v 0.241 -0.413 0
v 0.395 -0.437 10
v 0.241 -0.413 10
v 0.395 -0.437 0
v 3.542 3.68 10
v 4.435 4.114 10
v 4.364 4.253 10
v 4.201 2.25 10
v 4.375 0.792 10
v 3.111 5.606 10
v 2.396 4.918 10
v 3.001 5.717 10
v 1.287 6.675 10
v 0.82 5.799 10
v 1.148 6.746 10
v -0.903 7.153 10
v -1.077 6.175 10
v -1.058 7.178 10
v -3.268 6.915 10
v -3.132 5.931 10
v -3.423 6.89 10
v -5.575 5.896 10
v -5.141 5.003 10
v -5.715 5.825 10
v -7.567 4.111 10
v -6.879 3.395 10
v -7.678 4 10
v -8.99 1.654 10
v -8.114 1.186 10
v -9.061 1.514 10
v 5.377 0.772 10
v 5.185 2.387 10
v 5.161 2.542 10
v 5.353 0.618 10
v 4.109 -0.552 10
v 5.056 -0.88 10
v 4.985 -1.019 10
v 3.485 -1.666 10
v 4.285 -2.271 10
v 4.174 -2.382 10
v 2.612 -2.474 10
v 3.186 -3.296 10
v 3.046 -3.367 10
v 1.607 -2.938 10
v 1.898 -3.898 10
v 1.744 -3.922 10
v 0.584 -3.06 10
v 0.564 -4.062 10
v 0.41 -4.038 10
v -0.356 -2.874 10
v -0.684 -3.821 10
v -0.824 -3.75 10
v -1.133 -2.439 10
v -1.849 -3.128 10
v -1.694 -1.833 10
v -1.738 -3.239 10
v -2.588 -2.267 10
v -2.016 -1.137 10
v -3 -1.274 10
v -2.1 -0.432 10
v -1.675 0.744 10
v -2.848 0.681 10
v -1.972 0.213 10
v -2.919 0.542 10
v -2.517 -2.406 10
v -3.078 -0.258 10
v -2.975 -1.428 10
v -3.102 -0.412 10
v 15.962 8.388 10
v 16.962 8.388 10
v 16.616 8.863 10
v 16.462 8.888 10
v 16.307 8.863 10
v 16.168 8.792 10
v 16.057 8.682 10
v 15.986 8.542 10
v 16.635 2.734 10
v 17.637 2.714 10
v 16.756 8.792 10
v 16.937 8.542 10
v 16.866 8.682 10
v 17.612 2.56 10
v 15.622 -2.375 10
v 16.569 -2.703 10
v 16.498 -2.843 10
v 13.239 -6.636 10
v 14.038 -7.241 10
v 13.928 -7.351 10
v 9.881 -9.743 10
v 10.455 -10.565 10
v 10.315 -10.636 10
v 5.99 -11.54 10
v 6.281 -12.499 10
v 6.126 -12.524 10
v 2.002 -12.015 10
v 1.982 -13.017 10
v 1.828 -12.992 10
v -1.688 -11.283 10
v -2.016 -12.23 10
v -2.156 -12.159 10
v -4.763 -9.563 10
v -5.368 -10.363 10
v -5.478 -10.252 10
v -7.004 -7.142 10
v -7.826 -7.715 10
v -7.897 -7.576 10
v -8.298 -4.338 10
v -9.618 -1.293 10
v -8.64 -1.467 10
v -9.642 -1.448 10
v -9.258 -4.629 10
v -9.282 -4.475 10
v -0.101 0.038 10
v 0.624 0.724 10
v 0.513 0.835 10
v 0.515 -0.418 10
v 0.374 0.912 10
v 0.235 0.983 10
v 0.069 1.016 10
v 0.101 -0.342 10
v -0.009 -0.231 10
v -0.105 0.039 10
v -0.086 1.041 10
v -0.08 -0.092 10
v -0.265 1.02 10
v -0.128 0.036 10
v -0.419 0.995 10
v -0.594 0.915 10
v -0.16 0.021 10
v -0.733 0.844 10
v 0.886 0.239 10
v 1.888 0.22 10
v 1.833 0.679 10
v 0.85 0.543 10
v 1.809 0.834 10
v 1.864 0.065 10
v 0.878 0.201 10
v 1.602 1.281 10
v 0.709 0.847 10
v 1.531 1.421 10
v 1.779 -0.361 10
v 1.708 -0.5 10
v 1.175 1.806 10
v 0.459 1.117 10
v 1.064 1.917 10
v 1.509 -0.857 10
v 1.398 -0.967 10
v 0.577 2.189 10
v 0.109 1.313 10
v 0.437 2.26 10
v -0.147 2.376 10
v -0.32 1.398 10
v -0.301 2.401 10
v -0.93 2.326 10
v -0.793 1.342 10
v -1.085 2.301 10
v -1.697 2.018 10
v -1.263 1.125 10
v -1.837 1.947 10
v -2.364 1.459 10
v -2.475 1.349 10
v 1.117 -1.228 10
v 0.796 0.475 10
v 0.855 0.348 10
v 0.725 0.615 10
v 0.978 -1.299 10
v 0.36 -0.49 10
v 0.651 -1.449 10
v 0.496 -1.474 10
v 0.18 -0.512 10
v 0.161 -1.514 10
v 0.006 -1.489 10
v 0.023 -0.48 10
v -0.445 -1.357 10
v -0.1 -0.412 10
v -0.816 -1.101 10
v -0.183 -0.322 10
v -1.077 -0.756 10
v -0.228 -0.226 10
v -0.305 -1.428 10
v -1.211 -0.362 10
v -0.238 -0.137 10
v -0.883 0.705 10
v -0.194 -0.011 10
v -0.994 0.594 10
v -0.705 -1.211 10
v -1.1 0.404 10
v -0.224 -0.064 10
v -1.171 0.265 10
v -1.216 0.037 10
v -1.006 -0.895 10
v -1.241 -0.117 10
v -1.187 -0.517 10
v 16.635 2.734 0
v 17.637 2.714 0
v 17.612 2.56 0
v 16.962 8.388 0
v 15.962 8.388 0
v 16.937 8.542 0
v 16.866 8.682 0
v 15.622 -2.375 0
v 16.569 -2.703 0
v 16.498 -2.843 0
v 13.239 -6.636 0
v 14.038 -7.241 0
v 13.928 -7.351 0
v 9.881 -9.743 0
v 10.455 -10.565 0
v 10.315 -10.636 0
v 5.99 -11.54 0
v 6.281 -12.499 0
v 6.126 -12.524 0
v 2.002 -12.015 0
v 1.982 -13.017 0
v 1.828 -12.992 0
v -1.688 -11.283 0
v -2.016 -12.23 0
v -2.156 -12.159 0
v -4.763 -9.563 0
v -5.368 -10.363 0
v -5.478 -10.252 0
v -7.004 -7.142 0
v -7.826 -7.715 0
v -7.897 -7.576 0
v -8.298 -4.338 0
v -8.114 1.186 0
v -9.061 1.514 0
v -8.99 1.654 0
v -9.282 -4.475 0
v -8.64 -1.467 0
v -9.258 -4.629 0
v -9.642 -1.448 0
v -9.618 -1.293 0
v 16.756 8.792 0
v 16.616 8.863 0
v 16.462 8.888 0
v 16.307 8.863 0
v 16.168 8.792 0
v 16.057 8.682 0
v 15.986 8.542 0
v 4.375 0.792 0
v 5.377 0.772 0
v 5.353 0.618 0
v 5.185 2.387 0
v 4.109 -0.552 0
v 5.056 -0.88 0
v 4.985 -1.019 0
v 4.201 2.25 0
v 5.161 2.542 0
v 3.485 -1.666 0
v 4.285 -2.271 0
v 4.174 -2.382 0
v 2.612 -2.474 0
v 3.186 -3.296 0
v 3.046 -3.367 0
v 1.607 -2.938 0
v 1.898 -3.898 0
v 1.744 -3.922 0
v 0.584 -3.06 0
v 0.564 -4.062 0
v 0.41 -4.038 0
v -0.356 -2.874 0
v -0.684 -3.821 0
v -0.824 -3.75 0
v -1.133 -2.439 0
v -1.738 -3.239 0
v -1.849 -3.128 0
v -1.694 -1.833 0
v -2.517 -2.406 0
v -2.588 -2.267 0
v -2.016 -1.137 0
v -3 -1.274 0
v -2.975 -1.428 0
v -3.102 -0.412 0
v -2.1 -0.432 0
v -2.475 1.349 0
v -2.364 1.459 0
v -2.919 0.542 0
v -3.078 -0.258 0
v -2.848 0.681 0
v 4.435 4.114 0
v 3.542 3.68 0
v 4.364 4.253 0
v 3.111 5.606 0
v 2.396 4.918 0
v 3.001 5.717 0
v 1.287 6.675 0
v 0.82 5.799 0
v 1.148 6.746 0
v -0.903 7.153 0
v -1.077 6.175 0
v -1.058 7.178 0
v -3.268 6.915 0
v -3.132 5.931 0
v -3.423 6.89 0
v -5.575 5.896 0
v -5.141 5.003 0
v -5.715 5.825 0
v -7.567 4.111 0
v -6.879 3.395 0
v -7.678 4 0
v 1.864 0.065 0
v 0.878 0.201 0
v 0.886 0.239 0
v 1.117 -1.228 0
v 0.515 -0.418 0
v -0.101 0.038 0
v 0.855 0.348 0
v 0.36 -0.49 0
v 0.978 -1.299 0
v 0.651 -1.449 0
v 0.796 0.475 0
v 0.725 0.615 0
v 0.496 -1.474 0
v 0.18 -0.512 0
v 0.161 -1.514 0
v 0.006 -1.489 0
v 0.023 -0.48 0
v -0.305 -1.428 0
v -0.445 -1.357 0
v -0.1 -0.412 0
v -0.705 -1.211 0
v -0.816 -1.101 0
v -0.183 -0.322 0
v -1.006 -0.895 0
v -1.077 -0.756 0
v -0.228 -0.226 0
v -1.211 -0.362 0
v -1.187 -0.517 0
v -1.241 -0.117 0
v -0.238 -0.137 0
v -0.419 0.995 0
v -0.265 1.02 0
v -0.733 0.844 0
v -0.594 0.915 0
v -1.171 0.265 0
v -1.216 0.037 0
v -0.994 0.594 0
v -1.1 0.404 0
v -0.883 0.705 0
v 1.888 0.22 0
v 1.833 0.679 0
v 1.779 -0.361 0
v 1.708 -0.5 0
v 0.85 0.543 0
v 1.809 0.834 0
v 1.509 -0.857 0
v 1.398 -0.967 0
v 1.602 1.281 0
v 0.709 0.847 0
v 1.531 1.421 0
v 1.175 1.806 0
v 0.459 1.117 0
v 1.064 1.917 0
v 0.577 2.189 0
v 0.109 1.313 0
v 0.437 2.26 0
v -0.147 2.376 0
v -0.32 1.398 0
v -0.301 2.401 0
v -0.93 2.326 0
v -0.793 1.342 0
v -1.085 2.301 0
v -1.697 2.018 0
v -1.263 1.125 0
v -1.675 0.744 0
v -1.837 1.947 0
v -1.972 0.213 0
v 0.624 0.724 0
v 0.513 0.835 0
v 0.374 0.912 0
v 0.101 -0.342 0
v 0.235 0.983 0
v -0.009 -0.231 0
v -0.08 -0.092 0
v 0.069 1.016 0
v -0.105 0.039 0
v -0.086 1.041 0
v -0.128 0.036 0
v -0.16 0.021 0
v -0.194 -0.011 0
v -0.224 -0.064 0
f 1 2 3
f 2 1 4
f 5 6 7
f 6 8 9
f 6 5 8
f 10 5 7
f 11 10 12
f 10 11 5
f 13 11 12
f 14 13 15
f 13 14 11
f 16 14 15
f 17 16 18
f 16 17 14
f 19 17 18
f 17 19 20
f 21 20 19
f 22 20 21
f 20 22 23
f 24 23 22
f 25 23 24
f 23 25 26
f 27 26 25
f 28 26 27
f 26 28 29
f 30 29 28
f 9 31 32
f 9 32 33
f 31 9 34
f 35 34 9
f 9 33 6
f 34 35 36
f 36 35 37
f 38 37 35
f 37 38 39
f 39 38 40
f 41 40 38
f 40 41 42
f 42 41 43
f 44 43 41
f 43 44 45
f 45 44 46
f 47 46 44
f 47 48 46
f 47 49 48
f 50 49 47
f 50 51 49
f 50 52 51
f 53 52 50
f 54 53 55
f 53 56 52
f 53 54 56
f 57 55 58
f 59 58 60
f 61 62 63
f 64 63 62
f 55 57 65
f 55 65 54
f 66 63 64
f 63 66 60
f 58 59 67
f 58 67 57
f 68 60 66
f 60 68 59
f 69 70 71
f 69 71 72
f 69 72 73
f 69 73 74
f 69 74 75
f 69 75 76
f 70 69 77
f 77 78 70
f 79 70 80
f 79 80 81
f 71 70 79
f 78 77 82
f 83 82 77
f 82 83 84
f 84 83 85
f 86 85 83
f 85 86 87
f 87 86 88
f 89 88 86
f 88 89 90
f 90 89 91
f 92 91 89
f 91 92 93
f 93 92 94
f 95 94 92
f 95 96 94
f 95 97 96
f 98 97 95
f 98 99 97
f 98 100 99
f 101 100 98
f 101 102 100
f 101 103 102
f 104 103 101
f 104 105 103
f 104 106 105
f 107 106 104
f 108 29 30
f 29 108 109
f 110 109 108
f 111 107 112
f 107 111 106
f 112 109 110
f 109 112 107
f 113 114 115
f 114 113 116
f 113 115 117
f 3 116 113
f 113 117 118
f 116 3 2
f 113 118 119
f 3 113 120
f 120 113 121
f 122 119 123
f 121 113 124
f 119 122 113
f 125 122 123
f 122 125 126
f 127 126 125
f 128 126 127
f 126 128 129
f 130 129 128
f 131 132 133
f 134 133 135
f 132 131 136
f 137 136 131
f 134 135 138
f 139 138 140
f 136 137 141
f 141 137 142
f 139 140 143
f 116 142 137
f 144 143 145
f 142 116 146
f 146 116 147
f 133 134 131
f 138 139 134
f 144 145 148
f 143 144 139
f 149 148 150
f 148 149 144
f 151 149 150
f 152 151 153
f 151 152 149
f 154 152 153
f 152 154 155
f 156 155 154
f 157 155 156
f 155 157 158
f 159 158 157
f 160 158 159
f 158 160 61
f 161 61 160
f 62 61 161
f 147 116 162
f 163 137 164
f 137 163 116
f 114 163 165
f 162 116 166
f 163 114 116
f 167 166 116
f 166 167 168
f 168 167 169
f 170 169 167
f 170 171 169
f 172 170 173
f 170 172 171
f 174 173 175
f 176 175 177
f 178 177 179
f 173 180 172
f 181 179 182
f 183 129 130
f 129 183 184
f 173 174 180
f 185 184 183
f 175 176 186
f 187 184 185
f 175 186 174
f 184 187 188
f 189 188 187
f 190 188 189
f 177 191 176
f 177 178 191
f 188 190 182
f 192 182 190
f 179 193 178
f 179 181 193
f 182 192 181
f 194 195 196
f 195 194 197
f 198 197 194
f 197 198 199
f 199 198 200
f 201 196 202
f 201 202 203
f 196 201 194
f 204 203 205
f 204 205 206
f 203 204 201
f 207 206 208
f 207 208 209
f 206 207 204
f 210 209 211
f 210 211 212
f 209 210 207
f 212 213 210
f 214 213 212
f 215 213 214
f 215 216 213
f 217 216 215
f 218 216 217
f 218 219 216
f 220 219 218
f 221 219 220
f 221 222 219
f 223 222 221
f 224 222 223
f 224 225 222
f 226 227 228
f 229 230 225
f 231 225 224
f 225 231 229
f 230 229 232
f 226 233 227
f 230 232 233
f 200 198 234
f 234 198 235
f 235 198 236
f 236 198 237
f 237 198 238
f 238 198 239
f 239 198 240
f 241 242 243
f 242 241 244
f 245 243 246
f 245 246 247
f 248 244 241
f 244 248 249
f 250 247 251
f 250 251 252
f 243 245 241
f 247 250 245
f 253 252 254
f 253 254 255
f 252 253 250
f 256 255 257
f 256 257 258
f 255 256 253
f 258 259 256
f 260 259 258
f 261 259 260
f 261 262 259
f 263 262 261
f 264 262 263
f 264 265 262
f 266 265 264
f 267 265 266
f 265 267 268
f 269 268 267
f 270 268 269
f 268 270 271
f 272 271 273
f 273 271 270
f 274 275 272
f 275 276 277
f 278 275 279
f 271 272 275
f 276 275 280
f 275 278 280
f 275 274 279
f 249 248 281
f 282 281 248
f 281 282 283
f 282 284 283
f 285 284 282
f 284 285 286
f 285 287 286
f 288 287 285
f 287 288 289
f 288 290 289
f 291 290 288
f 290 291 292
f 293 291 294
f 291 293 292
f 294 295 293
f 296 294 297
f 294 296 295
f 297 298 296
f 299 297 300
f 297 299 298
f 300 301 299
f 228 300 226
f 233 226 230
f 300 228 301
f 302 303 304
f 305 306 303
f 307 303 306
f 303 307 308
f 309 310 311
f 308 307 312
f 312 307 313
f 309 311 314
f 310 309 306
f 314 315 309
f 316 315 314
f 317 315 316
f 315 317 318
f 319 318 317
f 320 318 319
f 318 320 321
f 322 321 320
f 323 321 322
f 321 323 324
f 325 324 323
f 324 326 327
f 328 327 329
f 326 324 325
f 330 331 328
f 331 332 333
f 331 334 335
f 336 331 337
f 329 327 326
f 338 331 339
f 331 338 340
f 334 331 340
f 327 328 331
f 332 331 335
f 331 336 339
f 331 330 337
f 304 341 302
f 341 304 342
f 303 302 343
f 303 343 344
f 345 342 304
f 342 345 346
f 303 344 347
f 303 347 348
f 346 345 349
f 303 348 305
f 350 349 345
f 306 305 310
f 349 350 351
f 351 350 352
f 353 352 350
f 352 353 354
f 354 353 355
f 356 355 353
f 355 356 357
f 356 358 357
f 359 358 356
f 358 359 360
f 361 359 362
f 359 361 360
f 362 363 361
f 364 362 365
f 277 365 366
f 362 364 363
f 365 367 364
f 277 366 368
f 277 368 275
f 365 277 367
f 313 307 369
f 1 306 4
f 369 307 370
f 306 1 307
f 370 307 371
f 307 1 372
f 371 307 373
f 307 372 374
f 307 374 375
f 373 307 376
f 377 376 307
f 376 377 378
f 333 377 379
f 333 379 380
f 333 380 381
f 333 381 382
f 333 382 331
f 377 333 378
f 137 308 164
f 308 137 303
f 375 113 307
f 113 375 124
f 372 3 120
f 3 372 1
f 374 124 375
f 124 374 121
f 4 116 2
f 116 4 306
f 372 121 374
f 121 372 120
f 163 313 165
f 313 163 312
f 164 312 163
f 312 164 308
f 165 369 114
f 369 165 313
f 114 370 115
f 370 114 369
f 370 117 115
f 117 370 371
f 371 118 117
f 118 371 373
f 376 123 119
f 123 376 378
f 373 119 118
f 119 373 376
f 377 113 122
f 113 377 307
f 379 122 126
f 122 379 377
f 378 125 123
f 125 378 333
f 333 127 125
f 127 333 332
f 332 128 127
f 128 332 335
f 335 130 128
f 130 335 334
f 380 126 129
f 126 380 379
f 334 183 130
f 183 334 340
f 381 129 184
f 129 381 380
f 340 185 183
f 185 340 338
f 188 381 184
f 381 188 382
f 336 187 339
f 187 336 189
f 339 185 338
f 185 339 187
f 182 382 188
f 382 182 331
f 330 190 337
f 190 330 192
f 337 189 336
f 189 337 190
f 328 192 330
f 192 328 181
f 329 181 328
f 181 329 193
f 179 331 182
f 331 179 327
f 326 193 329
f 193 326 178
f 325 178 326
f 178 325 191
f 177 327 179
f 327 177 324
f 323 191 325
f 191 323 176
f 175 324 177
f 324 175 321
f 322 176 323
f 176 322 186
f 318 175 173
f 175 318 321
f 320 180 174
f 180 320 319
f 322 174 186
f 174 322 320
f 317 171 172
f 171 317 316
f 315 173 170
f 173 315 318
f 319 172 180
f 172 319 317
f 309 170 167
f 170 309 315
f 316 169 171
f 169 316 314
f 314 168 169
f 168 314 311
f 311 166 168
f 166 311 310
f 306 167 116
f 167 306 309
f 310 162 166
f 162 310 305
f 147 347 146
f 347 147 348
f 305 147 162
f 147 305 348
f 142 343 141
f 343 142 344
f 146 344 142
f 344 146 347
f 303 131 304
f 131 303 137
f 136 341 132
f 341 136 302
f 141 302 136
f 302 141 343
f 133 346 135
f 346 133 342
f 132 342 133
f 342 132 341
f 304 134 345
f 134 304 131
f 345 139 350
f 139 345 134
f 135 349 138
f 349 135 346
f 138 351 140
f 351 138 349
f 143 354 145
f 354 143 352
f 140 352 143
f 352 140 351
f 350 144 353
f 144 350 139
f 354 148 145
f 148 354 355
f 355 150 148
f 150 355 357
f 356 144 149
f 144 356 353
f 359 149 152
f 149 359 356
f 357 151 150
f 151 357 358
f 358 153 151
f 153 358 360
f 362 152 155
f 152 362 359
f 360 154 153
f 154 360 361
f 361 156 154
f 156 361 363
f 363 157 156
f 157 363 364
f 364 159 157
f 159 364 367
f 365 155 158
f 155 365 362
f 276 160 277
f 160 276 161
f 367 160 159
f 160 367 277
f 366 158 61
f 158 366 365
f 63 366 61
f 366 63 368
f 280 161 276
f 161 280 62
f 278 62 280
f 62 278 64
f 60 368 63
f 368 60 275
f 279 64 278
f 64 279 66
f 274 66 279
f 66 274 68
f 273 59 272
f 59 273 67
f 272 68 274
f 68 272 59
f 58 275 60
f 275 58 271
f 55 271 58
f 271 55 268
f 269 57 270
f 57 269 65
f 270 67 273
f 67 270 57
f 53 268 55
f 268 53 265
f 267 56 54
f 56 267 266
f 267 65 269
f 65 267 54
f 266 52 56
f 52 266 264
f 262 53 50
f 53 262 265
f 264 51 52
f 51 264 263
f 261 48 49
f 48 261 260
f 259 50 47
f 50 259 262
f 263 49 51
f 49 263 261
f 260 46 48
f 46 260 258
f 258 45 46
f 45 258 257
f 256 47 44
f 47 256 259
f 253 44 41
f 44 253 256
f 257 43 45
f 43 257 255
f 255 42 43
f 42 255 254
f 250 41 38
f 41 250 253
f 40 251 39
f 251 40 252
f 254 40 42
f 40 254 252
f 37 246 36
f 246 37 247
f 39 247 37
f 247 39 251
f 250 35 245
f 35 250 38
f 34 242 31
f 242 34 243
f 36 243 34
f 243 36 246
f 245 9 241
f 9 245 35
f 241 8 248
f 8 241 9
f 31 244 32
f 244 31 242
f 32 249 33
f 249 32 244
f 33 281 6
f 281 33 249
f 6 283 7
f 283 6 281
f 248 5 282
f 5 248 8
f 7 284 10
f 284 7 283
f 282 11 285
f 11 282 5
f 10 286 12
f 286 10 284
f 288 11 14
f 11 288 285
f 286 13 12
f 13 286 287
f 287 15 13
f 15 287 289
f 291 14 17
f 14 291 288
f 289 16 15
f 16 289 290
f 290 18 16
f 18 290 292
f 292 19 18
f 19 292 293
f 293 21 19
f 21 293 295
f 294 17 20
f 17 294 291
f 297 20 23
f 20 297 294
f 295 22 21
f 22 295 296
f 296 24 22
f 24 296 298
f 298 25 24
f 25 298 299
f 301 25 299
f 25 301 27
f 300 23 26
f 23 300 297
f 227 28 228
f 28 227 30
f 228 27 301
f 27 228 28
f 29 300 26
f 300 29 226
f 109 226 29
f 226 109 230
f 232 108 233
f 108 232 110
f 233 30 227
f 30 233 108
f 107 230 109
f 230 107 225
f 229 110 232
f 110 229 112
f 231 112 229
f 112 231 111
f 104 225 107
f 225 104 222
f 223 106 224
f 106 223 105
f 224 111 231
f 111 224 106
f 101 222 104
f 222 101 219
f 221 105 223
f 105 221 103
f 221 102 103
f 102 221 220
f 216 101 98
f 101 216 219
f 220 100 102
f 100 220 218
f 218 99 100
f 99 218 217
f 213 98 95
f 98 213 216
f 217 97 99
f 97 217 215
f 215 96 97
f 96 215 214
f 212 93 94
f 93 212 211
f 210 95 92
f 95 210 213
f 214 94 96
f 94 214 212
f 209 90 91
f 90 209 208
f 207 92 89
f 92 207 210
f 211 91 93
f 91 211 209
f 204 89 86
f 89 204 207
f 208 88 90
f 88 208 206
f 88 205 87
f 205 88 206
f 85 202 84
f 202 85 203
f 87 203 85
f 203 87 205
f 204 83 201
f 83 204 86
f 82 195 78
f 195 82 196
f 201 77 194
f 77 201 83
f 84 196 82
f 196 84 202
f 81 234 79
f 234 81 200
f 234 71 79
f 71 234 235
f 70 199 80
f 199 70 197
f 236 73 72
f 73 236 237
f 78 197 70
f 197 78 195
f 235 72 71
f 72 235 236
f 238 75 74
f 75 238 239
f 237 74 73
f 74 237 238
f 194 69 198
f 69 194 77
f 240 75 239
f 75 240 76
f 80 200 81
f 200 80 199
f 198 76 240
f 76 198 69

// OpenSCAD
//A logarthmic Spiral has the form r=a*exp(b*theta);

loops=3;
$fn=20; //resolution
steps_per_loop=$fn;
wallThickness = 0.5;
height = 10;

a=0.4;
b=0.2;
incrementBy = 1;

for(i=[0:incrementBy:loops*steps_per_loop]){
hull(){
translate([r(rad(i))*cos(deg(i+0.5)),r(rad(i))*sin(deg(i+0.5)),0])
cylinder(r=wallThickness,height);

translate([r(rad(i+incrementBy))*cos(deg(i+incrementBy+0.5)),r(rad(i+1))*sin(deg(i+incrementBy+0.5)),0])
cylinder(r=wallThickness,height); 
}
}

////////////////// Functions //////////////////////////
function deg(n)=360*n/steps_per_loop;
function rad(n)=2*PI*n/steps_per_loop;
function arc_length(n)= //The length of a line segment = sqrt( (y2-y1)^2 + (x2-x1)^2 )
		sqrt(
			pow(
				r(rad(n+1))*sin(deg(n+1)) -
				r(rad(n))*sin(deg(n))
				,2) 
			+
			pow(
				r(rad(n+1))*cos(deg(n+1)) -
				r(rad(n))*cos(deg(n))
				,2)
			);
function r(th)=a*exp(b*th);
function d(i) =r(rad(i))/3;	
